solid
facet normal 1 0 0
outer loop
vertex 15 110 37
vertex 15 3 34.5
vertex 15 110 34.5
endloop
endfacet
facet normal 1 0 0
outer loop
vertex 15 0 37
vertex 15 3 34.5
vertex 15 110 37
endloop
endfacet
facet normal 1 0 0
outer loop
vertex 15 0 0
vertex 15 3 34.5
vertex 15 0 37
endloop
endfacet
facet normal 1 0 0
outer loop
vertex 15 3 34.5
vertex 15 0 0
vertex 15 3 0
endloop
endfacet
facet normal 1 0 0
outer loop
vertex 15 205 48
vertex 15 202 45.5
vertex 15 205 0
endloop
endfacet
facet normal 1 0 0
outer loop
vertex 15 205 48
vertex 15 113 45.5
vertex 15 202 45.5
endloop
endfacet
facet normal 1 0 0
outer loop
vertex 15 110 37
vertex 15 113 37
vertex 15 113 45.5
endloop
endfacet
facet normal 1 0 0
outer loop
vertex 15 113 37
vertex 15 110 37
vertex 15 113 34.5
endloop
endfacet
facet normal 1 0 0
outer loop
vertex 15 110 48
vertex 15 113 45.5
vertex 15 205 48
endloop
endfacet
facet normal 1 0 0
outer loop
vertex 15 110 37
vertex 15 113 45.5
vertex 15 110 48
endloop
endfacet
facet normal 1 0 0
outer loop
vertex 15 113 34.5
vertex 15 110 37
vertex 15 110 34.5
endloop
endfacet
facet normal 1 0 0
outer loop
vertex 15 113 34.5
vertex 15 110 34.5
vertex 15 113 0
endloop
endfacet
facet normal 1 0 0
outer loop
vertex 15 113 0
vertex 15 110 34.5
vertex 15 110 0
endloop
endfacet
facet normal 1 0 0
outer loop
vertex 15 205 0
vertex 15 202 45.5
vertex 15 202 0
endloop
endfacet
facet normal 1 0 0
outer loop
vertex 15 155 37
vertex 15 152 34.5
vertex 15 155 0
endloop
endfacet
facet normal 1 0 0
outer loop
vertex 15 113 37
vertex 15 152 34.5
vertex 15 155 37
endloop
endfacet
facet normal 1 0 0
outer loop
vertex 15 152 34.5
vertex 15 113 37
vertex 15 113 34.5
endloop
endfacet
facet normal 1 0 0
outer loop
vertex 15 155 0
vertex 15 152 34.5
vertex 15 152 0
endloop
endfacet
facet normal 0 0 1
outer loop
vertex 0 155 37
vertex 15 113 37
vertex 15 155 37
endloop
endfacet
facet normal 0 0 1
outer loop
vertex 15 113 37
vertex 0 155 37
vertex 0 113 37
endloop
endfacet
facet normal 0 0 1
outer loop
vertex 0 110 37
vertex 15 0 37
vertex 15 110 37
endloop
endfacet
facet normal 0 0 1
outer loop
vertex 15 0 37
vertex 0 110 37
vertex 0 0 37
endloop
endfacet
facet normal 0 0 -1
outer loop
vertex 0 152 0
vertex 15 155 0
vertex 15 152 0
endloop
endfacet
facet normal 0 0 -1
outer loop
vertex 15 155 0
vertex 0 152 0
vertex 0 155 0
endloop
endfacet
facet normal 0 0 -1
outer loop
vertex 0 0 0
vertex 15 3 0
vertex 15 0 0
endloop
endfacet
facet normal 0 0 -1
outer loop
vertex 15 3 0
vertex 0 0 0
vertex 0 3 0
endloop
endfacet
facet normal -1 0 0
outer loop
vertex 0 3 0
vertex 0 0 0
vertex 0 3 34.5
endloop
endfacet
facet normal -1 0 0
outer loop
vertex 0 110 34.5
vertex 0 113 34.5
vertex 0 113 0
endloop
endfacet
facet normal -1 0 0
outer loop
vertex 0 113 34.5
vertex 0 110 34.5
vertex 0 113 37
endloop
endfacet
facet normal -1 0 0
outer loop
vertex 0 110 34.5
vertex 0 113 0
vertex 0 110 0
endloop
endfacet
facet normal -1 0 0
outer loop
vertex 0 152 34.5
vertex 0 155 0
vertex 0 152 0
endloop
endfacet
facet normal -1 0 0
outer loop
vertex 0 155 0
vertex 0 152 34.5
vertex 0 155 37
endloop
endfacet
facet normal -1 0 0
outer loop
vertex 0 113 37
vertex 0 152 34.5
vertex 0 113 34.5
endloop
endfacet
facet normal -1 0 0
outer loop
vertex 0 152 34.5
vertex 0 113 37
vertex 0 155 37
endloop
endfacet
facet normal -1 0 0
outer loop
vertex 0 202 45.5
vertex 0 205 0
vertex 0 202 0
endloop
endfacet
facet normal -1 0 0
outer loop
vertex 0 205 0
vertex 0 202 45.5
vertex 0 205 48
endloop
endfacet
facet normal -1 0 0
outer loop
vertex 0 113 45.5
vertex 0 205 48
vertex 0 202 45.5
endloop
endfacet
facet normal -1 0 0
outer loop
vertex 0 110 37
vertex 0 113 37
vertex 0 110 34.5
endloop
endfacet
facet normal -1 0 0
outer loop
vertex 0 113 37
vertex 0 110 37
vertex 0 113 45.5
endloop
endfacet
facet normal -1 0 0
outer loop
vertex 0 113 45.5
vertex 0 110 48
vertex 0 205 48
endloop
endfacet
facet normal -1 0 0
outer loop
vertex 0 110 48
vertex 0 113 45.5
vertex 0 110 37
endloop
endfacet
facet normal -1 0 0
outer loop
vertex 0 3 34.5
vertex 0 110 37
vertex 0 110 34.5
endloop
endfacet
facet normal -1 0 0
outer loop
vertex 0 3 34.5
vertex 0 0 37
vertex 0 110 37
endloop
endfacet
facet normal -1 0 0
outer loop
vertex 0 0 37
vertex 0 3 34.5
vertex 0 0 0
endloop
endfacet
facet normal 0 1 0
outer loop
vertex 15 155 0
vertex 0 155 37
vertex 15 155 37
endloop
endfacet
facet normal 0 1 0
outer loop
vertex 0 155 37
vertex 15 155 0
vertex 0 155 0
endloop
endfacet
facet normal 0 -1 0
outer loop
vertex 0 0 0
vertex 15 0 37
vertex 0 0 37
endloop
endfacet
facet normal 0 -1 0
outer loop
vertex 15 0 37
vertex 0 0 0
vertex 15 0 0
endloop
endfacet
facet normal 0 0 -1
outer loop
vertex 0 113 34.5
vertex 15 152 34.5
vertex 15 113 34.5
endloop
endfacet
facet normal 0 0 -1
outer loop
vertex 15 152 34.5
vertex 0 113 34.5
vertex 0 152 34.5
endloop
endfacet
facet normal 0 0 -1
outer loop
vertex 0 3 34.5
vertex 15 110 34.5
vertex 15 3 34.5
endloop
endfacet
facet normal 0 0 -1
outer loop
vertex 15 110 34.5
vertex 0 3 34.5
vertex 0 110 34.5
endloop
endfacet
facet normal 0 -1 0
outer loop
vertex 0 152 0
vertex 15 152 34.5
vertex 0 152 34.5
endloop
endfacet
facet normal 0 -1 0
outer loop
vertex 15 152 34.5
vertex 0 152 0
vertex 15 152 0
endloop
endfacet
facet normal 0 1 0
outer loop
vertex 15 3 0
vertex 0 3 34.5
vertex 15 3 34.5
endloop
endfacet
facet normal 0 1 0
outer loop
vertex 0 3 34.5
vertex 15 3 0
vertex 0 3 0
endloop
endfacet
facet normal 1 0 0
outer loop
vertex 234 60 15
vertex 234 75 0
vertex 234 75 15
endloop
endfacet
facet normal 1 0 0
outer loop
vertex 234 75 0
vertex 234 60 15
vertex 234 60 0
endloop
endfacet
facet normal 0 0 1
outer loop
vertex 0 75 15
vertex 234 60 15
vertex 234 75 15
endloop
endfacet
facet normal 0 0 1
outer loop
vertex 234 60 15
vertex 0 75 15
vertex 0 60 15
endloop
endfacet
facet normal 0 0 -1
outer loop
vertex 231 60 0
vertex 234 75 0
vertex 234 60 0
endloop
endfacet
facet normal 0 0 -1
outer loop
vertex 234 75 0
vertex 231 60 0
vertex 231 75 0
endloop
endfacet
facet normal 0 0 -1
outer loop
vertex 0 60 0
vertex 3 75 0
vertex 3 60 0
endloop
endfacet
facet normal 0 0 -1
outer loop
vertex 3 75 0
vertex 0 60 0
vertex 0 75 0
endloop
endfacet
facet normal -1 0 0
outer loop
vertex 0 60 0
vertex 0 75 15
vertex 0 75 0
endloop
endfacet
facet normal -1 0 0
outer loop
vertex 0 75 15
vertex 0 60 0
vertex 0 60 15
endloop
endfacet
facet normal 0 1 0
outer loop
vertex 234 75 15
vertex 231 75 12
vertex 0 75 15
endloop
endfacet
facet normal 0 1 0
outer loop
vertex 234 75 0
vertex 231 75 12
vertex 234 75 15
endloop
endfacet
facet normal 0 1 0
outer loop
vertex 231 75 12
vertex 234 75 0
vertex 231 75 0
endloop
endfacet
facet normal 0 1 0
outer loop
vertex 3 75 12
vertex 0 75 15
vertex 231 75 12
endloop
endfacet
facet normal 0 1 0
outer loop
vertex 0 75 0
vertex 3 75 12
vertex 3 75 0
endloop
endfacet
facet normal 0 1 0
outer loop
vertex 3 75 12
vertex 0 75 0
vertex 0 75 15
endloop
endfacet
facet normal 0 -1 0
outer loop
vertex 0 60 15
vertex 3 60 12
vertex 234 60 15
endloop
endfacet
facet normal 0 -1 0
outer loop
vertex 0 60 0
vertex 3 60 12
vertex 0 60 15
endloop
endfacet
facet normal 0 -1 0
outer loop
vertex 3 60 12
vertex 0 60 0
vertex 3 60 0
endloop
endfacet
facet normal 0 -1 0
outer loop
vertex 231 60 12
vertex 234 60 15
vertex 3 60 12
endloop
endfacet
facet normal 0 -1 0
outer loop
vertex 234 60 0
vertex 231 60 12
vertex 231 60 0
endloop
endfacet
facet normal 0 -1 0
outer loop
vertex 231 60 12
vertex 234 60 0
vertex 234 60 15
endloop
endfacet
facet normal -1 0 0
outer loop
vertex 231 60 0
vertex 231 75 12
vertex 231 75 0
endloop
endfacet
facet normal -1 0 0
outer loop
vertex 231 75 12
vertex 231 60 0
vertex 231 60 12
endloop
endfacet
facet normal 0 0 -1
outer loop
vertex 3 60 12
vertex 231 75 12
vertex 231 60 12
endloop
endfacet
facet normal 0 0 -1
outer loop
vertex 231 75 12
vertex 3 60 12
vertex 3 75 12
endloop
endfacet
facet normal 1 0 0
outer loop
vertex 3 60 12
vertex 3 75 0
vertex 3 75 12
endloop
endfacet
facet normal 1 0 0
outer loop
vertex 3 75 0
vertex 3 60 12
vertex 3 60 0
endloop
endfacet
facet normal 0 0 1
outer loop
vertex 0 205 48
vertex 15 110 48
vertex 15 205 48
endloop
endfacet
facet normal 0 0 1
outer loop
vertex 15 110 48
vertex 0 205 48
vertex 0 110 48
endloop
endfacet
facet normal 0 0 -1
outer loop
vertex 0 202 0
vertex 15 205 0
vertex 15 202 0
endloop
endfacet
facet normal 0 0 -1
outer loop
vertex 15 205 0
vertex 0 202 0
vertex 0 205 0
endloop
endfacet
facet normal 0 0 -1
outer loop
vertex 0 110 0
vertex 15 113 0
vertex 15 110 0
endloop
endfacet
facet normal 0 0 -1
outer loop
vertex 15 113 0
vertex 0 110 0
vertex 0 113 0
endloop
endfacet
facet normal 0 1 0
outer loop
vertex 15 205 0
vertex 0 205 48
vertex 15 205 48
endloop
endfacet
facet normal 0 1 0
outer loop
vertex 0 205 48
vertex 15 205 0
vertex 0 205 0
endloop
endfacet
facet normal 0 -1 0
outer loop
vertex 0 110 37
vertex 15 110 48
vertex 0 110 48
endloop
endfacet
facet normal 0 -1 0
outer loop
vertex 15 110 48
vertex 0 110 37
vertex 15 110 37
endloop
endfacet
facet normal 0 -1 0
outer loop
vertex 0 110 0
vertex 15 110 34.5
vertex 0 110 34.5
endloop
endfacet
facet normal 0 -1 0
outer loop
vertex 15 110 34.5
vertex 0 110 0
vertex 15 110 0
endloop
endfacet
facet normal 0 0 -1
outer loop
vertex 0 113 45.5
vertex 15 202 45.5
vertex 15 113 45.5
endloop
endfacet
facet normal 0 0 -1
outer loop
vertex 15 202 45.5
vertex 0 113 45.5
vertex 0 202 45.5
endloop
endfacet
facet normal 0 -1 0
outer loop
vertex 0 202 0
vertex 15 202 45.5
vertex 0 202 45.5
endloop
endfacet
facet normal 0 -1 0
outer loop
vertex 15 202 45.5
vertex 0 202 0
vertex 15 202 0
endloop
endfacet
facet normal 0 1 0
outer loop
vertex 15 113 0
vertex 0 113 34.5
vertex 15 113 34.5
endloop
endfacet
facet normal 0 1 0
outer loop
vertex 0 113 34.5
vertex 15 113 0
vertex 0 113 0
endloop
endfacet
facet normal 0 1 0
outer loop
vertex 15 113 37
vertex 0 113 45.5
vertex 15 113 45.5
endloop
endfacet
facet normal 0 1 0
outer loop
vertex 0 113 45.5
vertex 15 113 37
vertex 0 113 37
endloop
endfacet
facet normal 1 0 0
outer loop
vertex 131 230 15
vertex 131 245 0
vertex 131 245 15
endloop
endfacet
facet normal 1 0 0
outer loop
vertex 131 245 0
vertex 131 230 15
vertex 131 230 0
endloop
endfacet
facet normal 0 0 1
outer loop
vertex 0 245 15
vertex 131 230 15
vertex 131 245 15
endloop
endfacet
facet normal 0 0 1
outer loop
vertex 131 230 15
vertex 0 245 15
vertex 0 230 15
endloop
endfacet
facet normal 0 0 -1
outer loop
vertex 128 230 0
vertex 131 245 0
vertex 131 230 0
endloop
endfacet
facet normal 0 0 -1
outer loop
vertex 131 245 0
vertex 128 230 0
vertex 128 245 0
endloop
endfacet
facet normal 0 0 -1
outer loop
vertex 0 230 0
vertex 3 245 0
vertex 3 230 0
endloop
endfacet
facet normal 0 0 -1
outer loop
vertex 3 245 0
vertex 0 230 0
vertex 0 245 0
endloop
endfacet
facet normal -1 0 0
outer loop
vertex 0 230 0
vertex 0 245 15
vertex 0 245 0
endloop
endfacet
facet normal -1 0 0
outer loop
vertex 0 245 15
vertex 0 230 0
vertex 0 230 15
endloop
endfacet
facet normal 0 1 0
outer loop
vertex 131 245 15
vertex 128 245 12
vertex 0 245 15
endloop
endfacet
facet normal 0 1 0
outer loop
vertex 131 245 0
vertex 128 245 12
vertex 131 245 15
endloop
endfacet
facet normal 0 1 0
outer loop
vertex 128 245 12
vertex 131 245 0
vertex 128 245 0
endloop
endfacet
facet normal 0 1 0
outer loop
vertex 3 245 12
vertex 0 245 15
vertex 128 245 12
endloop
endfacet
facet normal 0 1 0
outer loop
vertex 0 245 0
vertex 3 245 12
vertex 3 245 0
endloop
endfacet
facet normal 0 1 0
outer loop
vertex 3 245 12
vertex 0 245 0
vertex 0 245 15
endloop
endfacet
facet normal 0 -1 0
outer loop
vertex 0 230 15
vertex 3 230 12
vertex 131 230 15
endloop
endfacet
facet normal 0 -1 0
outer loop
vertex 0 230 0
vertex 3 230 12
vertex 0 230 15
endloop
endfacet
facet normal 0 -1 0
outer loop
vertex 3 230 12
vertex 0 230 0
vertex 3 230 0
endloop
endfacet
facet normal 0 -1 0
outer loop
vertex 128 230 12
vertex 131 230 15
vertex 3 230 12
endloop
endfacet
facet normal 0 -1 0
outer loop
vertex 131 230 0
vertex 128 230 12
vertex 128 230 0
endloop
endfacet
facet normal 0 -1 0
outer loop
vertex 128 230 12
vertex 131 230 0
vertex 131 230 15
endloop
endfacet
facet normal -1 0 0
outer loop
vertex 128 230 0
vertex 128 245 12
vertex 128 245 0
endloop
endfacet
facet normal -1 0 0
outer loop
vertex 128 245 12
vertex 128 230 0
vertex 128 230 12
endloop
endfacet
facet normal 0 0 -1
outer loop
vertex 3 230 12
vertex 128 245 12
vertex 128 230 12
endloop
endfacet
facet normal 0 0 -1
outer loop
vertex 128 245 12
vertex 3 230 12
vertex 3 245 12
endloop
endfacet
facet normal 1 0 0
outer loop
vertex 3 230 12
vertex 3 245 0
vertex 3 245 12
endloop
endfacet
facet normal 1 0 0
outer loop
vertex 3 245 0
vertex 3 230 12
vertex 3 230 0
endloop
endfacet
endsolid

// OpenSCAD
// Printable fit gauges for the I-211M-L rack mount project.
// Slip these over the real devices to validate measurements + ASA shrink
// before cutting the actual mount. Print at 100% — if a gauge is tight,
// the difference IS the number to bake into the final clearances.
//
// Render one part at a time:
//   openscad -D 'part="ont_cap"' -o stl/gauge-ont-cap.stl gauges.scad

include <devices.scad>
show_devices = false;   // suppress the device preview from devices.scad

part = "all";     // ont_cap | ont_length | brick_cap | brick_length | all

clear = 0.5;      // per-side clearance built into every gauge
wall = 3;
lip = 15;         // how far a cap slips onto the device

// C-channel cap that slips over the end of a w x h cross-section.
// Open on one long face (so it clears feet/labels) and at the mouth.
module end_cap(w, h) {
    iw = w + 2 * clear;
    ih = h + 2 * clear;
    difference() {
        cube([lip, iw + 2 * wall, ih + wall]);          // no floor wall: open face
        translate([-1, wall, -1]) cube([lip + 2, iw, ih + 1 + clear]);
    }
}

// U-bar: checks an outside length between two end stops.
module length_gauge(l, stop = 12) {
    il = l + 2 * clear;
    w = 15;
    difference() {
        cube([il + 2 * wall, w, stop + wall]);
        translate([wall, -1, -1]) cube([il, w + 2, stop + 1]);
    }
}

if (part == "ont_cap" || part == "all")
    end_cap(ont_w, ont_h);                              // 148 x 33 cross-section

if (part == "ont_length" || part == "all")
    translate([0, 60, 0]) length_gauge(ont_l);          // 227 outside length

if (part == "brick_cap" || part == "all")
    translate([0, 110, 0]) end_cap(brick_w, brick_h);   // 88 x 44 cross-section

if (part == "brick_length" || part == "all")
    translate([0, 230, 0]) length_gauge(brick_l);       // 128 outside length
